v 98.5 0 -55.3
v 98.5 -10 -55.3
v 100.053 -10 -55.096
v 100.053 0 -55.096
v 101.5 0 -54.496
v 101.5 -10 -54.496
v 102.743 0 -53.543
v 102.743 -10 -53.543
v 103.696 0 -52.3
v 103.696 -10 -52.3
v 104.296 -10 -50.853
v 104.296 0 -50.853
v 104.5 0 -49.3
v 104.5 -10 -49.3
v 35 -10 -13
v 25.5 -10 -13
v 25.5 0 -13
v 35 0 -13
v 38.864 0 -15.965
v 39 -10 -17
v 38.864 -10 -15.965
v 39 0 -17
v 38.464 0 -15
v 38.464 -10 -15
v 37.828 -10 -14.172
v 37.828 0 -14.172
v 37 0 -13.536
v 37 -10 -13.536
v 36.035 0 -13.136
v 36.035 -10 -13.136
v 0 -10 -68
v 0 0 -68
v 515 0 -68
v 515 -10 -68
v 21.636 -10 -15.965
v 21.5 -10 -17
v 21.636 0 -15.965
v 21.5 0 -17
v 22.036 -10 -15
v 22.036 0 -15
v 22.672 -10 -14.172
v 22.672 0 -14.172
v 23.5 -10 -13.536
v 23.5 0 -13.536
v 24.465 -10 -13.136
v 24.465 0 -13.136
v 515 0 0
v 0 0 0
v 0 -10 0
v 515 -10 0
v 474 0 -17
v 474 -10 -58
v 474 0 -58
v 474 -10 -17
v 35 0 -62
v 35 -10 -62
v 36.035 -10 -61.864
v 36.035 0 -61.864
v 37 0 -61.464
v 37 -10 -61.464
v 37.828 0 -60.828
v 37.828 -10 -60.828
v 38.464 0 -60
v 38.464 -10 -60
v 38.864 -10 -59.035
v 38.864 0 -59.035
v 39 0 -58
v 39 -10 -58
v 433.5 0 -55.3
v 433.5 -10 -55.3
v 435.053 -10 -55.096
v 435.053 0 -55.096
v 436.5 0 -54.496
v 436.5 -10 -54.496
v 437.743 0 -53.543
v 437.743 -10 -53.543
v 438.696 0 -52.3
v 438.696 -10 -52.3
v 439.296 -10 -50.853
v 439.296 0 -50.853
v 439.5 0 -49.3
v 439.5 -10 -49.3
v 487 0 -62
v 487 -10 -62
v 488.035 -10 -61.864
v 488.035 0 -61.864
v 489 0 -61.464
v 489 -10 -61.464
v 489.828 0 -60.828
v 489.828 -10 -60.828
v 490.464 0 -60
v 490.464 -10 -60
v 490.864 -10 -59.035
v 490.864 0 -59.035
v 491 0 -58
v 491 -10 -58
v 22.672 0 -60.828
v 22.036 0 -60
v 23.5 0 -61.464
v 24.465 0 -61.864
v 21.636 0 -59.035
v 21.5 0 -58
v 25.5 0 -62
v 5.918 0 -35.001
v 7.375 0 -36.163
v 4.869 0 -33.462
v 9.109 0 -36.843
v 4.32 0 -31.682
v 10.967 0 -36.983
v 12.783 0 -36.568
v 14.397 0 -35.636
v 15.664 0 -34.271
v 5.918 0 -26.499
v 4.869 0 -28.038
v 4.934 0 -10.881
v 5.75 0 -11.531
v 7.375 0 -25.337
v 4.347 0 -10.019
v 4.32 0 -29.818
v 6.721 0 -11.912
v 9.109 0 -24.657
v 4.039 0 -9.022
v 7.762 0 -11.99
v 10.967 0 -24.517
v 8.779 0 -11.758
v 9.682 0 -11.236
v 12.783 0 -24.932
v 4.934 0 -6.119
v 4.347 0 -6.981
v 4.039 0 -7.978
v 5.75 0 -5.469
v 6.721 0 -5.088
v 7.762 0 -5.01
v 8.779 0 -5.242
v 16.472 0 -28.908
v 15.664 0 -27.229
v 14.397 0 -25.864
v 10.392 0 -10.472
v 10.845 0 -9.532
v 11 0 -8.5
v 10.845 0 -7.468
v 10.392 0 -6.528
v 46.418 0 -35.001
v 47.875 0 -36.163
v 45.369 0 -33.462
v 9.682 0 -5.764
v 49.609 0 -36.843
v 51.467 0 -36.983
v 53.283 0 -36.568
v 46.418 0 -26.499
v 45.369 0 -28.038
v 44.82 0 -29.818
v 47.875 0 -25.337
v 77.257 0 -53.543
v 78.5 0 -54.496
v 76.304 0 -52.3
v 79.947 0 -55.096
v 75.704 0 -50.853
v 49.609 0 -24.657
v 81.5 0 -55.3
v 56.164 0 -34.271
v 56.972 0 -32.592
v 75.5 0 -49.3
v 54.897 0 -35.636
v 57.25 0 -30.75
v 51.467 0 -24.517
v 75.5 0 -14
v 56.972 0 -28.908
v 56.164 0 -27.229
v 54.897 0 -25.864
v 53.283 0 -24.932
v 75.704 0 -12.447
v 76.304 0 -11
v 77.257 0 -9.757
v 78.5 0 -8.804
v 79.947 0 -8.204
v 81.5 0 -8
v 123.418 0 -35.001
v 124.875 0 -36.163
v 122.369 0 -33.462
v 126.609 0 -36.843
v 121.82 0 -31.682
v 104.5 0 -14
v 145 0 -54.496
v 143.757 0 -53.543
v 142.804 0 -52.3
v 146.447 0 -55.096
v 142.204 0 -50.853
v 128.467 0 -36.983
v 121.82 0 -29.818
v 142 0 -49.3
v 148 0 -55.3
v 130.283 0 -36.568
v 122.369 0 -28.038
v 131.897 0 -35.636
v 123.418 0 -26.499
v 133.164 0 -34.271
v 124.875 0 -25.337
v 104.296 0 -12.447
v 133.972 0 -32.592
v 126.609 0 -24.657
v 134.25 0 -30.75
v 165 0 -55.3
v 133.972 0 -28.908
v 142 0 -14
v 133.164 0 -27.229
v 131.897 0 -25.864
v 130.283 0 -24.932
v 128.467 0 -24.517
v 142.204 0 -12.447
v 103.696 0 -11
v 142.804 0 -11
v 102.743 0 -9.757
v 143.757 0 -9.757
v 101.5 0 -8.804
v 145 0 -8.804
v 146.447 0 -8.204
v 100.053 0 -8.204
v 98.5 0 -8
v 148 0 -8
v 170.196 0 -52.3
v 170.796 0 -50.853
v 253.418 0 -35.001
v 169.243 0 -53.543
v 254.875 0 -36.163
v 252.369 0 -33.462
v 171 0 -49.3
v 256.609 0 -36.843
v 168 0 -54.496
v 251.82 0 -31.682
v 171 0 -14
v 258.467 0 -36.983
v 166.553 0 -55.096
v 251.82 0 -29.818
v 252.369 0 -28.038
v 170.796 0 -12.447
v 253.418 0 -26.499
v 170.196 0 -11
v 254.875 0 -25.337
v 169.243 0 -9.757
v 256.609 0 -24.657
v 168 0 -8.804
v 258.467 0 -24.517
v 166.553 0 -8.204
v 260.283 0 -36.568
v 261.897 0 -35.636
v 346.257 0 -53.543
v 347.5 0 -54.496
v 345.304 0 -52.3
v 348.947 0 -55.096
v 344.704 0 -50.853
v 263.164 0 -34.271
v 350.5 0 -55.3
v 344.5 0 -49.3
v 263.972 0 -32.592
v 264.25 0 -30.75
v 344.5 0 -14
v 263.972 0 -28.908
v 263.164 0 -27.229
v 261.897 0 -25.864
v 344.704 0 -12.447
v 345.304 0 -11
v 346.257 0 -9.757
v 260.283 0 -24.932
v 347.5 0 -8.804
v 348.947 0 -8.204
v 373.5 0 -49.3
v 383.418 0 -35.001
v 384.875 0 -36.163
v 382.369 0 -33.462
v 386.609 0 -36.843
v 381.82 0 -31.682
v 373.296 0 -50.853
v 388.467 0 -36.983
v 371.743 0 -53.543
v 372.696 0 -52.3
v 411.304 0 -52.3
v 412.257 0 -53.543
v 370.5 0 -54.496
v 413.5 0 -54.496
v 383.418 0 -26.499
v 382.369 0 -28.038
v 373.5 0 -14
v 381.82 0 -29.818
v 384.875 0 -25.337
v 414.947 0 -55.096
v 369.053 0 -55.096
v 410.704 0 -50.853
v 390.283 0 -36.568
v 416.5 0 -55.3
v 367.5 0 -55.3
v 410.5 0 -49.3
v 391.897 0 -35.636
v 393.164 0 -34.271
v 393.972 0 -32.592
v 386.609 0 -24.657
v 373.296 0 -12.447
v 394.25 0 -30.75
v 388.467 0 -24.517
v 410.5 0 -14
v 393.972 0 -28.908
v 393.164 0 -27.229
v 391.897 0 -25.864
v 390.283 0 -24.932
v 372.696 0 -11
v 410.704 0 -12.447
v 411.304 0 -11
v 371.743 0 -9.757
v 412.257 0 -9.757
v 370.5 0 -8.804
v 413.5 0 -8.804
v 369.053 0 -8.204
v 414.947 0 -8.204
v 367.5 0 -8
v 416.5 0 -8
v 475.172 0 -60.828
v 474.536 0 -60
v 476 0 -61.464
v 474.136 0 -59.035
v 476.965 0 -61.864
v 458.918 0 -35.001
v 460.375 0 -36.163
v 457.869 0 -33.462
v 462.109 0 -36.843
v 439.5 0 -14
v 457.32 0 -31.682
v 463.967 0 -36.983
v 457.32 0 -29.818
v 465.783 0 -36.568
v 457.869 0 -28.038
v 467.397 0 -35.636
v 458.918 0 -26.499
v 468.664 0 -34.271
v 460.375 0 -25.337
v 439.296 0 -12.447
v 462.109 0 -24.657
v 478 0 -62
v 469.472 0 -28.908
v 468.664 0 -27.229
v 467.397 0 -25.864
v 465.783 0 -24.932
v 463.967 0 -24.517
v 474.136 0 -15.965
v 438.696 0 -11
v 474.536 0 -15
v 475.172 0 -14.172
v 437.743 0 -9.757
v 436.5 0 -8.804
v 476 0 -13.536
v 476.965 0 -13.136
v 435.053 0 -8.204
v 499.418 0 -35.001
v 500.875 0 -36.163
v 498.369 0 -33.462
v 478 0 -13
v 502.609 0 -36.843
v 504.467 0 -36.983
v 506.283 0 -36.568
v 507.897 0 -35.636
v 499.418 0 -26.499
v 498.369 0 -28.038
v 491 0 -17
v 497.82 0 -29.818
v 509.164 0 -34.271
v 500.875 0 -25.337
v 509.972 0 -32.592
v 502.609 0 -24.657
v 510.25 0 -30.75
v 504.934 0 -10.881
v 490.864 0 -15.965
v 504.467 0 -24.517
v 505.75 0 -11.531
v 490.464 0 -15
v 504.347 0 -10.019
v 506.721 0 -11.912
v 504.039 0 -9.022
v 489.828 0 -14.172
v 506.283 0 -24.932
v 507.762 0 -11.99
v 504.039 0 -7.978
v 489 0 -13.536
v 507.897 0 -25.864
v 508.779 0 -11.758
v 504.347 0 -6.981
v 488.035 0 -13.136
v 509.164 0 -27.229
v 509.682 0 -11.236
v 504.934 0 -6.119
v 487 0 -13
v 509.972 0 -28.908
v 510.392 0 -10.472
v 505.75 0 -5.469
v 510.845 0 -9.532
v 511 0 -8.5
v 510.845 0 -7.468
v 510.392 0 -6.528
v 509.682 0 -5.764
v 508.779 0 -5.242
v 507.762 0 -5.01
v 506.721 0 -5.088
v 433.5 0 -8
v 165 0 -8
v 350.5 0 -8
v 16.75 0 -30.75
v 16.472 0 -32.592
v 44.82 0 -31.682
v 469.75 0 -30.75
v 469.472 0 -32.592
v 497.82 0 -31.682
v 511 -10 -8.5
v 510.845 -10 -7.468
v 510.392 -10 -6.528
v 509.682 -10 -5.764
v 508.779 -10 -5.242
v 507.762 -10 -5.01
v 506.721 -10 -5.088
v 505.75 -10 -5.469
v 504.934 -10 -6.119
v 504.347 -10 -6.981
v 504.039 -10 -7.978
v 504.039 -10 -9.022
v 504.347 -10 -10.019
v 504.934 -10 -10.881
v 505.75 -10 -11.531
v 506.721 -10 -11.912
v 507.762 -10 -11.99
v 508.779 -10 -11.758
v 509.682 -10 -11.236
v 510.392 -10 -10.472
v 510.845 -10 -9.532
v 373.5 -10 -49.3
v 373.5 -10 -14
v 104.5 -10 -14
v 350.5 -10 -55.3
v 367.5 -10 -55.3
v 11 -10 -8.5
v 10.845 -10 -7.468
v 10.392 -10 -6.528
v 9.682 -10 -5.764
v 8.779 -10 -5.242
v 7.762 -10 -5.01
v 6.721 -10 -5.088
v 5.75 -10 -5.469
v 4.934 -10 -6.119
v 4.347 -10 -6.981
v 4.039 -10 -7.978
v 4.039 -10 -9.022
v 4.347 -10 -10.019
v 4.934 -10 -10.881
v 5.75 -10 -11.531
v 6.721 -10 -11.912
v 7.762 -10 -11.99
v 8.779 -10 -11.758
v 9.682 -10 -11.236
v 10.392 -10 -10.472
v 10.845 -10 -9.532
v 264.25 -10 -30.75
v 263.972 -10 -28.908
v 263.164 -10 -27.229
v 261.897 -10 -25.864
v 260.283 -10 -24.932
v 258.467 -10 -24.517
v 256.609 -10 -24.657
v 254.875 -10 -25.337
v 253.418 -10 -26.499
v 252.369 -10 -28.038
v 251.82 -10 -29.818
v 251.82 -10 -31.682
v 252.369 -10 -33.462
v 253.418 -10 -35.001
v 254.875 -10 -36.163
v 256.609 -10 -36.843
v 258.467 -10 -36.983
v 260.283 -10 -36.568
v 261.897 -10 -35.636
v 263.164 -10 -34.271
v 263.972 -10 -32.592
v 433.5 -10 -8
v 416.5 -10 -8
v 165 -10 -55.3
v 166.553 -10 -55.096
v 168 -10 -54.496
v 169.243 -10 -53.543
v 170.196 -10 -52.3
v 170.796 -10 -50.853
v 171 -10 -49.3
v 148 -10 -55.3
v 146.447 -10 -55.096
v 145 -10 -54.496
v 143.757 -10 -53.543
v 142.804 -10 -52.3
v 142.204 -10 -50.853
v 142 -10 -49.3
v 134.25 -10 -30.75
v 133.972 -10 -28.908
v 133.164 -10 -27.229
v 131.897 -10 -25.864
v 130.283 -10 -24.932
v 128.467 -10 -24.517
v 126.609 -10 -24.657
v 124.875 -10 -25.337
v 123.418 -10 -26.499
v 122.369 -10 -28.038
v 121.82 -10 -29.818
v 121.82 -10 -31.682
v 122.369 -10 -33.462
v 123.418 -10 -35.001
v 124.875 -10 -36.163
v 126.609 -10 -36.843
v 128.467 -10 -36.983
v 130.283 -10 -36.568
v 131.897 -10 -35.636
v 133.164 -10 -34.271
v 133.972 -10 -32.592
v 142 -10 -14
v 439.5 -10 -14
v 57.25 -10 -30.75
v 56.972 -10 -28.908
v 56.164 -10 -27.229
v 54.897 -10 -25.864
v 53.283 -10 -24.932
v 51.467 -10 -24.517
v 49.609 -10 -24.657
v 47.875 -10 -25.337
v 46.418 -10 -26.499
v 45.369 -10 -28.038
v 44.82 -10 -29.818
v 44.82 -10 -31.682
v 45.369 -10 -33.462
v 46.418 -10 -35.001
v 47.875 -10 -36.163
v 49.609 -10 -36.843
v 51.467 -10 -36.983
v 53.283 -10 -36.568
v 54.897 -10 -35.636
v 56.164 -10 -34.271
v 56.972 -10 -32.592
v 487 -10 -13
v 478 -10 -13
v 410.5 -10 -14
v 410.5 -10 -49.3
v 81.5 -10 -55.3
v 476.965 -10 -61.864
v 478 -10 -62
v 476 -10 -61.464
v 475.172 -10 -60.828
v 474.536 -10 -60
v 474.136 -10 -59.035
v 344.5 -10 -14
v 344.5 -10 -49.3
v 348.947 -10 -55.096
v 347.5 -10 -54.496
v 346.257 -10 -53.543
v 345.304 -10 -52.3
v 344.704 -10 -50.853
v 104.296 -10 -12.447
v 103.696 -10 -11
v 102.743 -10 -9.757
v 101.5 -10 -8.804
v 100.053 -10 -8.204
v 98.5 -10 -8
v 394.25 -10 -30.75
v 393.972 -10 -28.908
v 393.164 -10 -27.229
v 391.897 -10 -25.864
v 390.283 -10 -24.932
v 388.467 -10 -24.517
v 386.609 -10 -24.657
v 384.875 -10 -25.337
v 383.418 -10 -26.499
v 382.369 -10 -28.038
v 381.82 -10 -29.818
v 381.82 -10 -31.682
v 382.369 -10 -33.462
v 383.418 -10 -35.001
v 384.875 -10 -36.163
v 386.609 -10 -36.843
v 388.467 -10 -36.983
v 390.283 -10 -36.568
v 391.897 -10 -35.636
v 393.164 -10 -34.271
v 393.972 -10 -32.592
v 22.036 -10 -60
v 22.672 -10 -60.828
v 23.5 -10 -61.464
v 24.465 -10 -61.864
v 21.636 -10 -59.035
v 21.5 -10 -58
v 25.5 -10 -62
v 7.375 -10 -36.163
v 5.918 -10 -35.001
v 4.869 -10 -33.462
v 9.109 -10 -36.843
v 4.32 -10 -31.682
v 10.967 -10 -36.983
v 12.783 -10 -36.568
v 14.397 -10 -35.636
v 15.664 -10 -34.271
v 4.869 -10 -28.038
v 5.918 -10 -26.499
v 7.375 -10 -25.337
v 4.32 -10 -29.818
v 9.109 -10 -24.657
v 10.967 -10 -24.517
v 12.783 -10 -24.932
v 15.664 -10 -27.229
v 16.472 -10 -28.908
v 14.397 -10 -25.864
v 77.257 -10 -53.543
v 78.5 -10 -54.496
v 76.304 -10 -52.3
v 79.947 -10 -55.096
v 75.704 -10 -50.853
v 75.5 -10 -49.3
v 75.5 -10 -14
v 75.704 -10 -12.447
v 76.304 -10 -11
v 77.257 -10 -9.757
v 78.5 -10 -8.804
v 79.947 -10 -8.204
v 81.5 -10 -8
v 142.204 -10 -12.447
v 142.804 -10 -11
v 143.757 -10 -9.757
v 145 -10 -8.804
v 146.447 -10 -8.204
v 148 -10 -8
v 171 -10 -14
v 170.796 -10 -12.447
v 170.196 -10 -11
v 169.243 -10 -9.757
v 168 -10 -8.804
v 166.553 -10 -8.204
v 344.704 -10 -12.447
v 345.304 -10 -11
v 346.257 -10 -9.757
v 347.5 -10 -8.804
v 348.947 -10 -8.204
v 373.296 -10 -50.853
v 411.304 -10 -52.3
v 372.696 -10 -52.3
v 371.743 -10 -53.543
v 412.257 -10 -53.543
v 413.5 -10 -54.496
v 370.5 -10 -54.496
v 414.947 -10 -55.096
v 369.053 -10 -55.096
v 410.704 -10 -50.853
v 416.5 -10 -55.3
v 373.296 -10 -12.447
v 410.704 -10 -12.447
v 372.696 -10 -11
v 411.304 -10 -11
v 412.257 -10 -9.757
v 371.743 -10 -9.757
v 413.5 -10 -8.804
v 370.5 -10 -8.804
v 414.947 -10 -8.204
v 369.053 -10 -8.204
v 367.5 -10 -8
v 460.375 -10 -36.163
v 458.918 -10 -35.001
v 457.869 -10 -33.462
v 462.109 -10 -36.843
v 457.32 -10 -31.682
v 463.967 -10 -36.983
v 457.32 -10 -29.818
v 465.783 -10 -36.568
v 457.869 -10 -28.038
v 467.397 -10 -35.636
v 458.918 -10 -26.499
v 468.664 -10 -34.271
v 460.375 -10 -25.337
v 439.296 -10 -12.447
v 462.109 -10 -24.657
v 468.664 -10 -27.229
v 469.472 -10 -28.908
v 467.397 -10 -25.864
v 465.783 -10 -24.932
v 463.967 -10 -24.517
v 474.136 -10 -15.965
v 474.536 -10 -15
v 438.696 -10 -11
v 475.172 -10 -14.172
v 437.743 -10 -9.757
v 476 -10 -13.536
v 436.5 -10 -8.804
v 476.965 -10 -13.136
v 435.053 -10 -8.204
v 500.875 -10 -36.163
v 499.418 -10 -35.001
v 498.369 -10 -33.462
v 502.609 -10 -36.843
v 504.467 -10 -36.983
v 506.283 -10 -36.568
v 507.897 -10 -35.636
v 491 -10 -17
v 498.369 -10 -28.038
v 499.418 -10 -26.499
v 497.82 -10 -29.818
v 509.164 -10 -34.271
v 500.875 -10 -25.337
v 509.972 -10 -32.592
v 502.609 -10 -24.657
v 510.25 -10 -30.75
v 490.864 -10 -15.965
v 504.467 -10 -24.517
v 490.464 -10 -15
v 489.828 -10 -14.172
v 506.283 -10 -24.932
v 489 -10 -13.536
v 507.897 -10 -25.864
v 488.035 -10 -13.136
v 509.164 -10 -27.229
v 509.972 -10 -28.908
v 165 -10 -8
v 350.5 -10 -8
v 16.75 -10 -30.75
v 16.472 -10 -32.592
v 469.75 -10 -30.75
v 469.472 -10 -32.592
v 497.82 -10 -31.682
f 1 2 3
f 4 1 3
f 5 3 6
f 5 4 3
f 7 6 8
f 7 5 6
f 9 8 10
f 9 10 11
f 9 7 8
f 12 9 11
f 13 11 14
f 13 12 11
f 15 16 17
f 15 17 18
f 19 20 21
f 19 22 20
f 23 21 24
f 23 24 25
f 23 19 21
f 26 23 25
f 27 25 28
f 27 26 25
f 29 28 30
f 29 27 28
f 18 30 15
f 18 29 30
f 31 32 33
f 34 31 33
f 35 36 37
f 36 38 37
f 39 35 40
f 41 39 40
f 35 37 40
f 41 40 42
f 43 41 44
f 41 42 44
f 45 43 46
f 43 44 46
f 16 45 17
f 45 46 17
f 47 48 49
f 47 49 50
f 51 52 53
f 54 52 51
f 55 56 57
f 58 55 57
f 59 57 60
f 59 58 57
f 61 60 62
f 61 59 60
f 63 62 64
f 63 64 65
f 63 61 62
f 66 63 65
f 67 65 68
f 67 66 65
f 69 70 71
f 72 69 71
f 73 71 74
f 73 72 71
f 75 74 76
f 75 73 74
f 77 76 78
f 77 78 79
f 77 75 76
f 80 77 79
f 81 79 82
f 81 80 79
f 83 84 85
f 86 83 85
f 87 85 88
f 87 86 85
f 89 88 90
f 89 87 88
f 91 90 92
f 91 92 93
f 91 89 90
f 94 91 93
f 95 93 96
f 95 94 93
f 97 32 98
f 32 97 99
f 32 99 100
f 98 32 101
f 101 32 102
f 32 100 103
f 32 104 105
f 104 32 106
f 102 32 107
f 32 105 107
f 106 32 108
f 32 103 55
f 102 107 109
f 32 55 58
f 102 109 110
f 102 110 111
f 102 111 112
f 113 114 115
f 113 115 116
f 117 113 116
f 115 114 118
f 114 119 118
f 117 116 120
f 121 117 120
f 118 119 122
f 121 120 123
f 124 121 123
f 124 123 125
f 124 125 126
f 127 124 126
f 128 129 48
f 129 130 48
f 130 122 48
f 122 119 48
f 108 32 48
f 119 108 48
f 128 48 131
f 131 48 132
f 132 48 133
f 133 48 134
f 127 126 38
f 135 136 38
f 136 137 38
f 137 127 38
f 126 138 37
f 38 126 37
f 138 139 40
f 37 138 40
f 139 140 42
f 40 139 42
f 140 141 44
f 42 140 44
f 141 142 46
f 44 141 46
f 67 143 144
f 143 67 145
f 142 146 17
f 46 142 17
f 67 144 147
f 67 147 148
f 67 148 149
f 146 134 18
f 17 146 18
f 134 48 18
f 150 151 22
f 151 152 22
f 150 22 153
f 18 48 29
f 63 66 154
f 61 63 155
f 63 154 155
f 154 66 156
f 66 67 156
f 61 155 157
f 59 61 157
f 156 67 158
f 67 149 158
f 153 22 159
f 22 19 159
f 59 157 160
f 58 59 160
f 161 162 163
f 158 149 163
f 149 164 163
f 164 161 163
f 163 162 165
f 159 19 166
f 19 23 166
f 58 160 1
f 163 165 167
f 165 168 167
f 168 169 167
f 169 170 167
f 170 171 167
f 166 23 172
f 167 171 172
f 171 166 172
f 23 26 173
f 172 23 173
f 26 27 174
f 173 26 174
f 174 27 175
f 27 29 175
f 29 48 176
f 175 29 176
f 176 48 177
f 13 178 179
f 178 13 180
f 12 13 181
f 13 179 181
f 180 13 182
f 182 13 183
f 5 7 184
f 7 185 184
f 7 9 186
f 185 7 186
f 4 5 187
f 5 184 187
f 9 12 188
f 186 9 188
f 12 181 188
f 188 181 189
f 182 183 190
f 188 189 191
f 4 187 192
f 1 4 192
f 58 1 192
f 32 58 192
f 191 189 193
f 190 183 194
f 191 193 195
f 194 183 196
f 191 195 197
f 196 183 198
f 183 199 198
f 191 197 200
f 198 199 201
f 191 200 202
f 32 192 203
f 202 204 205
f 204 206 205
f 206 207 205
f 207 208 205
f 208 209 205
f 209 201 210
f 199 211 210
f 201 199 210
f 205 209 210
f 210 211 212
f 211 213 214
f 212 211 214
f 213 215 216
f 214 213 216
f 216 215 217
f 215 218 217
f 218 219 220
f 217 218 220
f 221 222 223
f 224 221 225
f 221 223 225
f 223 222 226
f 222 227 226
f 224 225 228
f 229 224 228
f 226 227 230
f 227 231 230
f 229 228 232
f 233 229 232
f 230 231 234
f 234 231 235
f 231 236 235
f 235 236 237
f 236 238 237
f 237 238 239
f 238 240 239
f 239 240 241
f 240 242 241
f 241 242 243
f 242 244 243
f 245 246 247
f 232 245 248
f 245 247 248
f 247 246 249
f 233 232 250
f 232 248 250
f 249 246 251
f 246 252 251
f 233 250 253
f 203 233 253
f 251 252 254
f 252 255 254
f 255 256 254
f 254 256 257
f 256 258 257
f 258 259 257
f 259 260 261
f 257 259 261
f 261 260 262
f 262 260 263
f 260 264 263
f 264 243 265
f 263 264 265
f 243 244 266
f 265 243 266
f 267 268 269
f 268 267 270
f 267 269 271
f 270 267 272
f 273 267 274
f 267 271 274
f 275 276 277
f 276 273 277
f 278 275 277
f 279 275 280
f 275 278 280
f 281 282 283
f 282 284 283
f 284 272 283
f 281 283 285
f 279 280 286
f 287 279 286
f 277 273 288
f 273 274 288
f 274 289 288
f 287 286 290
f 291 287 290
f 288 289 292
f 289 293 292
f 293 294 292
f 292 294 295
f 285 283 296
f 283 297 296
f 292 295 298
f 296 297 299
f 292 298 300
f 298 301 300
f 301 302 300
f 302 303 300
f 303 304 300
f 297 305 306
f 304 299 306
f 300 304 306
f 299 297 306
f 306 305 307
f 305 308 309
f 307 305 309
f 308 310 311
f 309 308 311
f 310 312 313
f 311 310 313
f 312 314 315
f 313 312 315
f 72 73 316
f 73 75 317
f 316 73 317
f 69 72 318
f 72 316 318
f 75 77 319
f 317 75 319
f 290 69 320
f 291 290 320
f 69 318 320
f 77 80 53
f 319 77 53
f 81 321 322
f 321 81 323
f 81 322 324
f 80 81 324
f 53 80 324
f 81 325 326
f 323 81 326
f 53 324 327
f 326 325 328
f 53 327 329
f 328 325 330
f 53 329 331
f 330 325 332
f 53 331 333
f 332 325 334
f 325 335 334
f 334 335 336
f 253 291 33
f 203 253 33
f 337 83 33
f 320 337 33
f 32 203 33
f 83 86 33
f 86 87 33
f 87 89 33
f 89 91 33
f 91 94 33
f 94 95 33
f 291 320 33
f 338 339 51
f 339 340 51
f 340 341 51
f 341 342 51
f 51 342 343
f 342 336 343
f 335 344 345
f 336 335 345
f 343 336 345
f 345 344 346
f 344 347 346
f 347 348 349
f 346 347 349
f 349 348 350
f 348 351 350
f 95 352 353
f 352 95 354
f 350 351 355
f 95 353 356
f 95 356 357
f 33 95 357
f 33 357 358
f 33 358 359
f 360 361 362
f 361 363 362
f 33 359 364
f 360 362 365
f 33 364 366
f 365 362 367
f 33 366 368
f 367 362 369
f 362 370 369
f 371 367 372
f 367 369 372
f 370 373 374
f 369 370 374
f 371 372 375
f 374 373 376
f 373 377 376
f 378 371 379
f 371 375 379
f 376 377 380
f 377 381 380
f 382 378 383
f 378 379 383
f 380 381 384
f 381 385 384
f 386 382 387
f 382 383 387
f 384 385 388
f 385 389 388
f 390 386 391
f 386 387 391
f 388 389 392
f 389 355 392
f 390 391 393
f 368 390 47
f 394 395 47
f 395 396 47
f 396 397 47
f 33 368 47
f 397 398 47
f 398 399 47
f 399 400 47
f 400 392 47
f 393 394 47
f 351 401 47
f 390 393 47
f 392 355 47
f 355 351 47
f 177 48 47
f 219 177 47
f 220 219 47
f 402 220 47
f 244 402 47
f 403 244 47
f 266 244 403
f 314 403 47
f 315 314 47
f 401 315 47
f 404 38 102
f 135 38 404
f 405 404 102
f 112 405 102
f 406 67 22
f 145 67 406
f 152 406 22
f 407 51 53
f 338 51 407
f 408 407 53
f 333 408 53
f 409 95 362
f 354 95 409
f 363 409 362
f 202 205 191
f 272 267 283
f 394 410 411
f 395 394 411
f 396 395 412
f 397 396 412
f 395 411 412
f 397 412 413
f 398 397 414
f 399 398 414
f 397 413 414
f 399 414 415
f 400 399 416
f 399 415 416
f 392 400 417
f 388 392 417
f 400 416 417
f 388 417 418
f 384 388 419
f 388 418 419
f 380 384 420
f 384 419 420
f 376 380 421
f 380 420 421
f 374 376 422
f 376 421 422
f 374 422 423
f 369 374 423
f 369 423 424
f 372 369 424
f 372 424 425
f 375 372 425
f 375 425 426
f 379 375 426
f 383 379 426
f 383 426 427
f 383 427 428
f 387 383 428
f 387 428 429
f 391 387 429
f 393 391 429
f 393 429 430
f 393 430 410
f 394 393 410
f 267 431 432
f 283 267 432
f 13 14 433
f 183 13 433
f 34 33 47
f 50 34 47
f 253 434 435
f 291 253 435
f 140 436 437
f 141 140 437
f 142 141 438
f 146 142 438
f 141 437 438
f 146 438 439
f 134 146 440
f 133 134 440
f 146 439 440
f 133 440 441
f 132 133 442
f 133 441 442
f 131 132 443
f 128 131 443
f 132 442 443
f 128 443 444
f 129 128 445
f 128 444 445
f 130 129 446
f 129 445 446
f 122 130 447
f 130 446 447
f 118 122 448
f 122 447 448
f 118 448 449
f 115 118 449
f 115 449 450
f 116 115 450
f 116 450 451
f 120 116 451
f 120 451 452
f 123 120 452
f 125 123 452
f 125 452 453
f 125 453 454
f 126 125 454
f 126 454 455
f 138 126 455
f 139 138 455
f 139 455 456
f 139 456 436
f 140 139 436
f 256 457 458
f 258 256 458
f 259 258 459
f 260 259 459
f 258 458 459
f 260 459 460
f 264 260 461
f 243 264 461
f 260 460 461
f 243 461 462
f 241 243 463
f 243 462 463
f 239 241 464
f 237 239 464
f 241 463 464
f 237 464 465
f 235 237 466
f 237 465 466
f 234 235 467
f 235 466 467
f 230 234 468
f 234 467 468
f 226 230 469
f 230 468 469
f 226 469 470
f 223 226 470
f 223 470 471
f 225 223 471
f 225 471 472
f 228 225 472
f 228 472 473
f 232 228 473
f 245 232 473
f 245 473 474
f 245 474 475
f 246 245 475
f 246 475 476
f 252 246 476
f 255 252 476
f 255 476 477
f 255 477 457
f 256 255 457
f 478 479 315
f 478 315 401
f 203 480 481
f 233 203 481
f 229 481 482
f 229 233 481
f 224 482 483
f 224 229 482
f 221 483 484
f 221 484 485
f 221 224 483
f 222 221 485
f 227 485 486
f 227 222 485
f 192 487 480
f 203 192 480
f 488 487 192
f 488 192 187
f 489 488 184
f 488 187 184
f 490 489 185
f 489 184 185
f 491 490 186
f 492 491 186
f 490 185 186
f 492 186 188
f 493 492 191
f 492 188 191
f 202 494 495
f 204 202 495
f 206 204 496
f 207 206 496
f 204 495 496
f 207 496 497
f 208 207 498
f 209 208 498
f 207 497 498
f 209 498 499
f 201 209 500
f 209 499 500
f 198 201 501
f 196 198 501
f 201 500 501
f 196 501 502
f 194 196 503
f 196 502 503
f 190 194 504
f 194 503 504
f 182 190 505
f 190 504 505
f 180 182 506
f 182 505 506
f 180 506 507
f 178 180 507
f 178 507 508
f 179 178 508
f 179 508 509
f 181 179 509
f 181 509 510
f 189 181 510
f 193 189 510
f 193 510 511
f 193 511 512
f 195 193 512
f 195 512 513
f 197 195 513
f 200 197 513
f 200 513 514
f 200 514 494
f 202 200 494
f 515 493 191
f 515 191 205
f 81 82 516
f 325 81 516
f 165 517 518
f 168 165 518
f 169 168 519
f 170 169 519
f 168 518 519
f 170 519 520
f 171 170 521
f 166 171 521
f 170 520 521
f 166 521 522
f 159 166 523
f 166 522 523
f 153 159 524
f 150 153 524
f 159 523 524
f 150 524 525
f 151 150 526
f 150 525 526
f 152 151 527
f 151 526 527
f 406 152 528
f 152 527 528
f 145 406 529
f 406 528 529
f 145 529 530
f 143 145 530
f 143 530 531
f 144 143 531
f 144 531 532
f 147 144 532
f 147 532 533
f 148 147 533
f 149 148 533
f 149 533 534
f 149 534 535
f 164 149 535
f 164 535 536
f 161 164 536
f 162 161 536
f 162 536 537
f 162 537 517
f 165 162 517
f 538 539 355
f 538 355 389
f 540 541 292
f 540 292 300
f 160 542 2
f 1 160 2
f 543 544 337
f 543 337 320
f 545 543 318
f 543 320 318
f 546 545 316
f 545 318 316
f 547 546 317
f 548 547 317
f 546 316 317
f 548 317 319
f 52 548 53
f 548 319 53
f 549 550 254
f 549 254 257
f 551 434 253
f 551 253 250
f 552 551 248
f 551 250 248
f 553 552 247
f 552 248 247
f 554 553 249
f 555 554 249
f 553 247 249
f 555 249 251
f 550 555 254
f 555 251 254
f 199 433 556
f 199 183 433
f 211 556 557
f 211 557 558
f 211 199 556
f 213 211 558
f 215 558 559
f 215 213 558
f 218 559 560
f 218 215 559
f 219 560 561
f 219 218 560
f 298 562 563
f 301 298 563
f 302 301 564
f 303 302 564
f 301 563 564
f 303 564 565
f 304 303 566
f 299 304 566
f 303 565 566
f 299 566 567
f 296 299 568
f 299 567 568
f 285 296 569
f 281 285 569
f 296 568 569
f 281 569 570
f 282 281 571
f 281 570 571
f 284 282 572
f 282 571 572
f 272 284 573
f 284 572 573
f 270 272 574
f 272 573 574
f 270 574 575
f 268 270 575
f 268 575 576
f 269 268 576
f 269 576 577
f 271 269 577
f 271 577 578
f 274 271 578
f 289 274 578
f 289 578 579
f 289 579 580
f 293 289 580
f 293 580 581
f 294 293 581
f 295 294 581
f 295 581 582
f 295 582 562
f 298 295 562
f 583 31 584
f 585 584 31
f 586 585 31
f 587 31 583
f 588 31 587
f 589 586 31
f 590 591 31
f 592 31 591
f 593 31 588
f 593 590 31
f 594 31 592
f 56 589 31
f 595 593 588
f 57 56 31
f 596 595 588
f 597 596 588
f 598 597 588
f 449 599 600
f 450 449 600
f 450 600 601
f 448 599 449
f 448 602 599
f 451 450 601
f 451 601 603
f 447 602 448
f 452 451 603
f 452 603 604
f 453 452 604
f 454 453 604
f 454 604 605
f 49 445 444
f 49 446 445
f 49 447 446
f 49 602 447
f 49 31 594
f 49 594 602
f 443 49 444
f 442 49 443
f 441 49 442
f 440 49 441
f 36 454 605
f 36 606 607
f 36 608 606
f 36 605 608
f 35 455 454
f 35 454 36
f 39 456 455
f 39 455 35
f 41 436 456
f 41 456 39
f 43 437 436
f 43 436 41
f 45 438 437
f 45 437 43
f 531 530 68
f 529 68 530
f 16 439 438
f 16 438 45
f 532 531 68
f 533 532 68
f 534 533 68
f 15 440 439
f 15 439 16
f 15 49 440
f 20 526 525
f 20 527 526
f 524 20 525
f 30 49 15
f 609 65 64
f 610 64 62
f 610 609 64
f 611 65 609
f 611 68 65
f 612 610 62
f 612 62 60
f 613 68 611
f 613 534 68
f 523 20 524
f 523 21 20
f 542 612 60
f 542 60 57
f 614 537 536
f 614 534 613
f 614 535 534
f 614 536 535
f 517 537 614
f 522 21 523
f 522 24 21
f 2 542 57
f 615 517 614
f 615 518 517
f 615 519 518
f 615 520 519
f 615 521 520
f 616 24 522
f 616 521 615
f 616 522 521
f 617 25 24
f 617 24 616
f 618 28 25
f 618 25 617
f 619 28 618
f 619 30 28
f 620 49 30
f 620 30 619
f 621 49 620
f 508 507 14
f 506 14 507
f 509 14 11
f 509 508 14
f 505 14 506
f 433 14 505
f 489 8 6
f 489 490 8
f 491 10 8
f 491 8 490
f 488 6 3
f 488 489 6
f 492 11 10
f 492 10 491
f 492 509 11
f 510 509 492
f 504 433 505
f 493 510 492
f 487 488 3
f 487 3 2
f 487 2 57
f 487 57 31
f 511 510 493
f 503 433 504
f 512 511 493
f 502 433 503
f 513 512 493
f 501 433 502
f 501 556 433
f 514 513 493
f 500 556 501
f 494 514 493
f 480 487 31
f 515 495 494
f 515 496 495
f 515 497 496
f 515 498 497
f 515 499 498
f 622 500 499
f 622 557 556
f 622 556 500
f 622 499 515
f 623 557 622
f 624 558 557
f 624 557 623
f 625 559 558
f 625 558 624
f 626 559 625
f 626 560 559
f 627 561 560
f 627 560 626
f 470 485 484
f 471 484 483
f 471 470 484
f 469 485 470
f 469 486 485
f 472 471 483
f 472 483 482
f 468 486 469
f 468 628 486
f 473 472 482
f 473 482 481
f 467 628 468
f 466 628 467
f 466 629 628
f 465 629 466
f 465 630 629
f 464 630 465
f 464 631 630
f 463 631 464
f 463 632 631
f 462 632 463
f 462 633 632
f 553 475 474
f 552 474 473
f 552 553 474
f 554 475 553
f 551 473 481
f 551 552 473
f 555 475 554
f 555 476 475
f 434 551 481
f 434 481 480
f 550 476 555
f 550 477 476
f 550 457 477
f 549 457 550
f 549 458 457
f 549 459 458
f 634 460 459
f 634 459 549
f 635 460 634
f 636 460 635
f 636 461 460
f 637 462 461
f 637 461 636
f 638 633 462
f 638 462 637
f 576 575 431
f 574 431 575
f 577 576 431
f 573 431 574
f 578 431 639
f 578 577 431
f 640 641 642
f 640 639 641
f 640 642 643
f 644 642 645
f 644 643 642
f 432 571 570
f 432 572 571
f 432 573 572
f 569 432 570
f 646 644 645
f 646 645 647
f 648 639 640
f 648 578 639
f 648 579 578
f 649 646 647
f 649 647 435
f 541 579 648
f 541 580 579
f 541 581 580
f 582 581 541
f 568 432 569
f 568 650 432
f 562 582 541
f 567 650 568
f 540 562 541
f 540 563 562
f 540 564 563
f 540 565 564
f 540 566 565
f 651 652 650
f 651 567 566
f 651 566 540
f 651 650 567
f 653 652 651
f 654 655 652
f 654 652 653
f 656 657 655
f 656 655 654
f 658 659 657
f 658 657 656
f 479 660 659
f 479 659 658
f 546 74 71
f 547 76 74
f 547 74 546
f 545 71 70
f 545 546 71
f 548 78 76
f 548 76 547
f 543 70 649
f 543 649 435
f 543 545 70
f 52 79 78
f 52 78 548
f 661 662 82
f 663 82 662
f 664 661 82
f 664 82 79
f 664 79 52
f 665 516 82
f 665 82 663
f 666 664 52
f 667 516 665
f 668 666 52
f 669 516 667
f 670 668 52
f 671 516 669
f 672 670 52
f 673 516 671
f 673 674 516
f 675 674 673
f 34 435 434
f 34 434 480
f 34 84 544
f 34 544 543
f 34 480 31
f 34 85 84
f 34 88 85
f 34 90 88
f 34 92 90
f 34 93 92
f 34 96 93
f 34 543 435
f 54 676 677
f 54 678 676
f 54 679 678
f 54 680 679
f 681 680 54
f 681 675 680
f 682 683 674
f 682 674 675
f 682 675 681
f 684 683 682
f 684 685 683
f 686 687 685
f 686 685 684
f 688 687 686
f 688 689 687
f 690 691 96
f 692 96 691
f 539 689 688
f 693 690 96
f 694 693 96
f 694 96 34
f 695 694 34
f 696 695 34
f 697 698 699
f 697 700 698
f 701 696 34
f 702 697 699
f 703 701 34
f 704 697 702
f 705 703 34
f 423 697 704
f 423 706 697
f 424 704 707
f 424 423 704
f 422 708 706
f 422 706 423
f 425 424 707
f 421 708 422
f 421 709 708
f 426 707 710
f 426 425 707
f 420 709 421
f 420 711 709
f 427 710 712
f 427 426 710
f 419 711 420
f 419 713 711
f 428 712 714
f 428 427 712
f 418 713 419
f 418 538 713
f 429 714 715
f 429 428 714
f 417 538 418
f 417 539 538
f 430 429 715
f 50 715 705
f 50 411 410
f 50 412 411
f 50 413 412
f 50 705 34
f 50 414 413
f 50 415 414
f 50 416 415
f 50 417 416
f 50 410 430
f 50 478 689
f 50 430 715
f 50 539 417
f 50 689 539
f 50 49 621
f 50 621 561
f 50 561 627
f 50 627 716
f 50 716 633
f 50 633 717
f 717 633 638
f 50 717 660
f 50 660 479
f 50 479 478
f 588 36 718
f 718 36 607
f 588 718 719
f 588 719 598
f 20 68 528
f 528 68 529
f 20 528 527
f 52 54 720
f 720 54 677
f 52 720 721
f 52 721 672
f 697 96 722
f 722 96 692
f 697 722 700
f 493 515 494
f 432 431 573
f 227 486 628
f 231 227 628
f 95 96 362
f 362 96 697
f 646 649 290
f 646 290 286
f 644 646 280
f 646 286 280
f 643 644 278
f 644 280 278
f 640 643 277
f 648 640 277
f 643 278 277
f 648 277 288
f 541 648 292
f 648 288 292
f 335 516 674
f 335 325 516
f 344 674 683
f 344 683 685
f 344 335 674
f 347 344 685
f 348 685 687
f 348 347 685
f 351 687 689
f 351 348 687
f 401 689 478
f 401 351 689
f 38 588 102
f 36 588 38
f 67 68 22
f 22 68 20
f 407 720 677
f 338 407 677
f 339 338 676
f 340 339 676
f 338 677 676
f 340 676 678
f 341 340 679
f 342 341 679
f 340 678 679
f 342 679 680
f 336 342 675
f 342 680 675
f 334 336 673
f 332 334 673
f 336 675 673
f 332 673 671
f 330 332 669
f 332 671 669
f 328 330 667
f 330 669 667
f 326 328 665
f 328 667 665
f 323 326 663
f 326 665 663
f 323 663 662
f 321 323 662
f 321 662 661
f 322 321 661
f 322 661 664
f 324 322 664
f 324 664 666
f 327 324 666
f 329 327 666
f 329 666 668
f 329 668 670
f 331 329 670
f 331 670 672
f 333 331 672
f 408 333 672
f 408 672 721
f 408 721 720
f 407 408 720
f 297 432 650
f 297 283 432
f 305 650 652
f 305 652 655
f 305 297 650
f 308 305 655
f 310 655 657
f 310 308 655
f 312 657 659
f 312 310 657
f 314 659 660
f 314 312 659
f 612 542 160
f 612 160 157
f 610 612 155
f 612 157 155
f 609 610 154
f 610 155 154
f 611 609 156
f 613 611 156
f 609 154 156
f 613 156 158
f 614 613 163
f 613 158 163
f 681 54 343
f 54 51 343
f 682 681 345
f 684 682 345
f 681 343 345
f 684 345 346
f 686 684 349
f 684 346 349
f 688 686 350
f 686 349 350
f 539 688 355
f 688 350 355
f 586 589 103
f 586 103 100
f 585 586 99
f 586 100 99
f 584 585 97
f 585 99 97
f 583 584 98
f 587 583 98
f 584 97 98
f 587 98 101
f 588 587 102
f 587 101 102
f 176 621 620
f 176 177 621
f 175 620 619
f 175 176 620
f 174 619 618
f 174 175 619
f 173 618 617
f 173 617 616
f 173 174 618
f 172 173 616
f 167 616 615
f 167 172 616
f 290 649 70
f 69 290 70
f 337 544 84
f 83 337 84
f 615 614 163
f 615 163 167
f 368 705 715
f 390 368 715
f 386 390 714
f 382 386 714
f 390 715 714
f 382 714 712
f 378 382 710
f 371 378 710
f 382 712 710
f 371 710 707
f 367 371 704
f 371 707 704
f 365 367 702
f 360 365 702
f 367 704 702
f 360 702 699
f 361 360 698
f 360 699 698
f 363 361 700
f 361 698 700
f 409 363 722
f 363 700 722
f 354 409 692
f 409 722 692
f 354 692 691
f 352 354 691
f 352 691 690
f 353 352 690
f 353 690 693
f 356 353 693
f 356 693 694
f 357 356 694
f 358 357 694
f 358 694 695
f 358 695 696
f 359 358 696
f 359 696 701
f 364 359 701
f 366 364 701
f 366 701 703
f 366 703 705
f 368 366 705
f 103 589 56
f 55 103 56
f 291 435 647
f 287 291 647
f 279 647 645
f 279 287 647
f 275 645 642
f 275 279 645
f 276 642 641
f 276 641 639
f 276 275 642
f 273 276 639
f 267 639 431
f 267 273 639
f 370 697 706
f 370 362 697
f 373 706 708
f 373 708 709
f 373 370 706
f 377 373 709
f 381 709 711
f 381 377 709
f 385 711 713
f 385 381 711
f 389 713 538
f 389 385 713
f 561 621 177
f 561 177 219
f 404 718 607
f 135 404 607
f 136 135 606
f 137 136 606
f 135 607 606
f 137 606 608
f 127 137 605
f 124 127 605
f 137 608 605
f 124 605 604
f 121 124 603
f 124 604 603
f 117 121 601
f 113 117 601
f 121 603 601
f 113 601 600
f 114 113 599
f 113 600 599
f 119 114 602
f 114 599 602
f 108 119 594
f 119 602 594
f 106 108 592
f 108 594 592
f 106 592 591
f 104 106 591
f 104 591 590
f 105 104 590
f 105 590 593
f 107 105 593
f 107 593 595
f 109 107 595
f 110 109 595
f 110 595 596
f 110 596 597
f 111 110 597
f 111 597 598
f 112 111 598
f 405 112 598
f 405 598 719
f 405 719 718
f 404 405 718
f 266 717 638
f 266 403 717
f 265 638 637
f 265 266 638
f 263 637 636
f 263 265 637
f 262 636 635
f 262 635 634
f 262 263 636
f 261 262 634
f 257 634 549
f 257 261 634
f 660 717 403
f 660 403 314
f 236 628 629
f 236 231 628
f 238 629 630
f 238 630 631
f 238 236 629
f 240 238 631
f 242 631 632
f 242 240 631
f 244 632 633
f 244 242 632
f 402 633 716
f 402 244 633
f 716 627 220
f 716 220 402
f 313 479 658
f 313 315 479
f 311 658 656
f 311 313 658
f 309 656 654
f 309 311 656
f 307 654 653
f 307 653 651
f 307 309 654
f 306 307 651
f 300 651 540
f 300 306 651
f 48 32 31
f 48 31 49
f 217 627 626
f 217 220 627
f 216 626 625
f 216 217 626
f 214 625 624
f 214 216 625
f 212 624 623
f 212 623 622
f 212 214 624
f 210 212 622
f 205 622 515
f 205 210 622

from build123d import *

# Parameters (mm, degrees)
F0_W     = 515
F0_H     = 68
F1_DEPTH = 10
F2_R     = 3.5
F2_R_2   = 6.25
F3_DEPTH = 10.001
F4_W     = 17.5
F4_H     = 49
F4_W_2   = 17
F5_DEPTH = 10.001
F4_W_3   = 29
F4_H_2   = 47.3
F6_DEPTH = 10.001
F7_R     = 4
F8_R     = 6


with BuildPart() as f1:
    # F0 (on Front) → F1 (new body)
    with BuildSketch(Plane.XZ):
        with Locations((257.5, -34)):
            Rectangle(F0_W, F0_H)
    extrude(amount=F1_DEPTH)

    # F2 (on face) → F3 (cut, through all)
    with BuildSketch(Plane.XZ.offset(10)):
        with Locations((7.5, -8.5)):
            Circle(F2_R)
        with Locations((507.5, -8.5)):
            Circle(F2_R)
        with Locations((10.5, -30.75)):
            Circle(F2_R_2)
        with Locations((51, -30.75)):
            Circle(F2_R_2)
        with Locations((128, -30.75)):
            Circle(F2_R_2)
        with Locations((258, -30.75)):
            Circle(F2_R_2)
        with Locations((388, -30.75)):
            Circle(F2_R_2)
        with Locations((463.5, -30.75)):
            Circle(F2_R_2)
        with Locations((504, -30.75)):
            Circle(F2_R_2)
    extrude(amount=-F3_DEPTH, mode=Mode.SUBTRACT)

    # F4 (on face) → F5 (cut, through all)
    with BuildSketch(Plane.XZ.offset(10)):
        with Locations((30.25, -37.5)):
            Rectangle(F4_W, F4_H)
        with Locations((482.5, -37.5)):
            Rectangle(F4_W_2, F4_H)
    extrude(amount=-F5_DEPTH, mode=Mode.SUBTRACT)

    # F4 (on face) → F6 (cut, through all)
    with BuildSketch(Plane.XZ.offset(10)):
        with Locations((90, -31.65)):
            Rectangle(F4_W_3, F4_H_2)
        with Locations((156.5, -31.65)):
            Rectangle(F4_W_3, F4_H_2)
        with Locations((359, -31.65)):
            Rectangle(F4_W_3, F4_H_2)
        with Locations((425, -31.65)):
            Rectangle(F4_W_3, F4_H_2)
    extrude(amount=-F6_DEPTH, mode=Mode.SUBTRACT)

    # F7
    f7_edges = [f1.edges().sort_by_distance(p)[0] for p in [
        (21.5, -5, -13),
        (21.5, -5, -62),
        (39, -5, -62),
        (39, -5, -13),
        (491, -5, -13),
        (474, -5, -13),
        (474, -5, -62),
        (491, -5, -62),
    ]]
    fillet(f7_edges, radius=F7_R)

    # F8
    f8_edges = [f1.edges().sort_by_distance(p)[0] for p in [
        (410.5, -5, -8),
        (439.5, -5, -8),
        (75.5, -5, -8),
        (104.5, -5, -8),
        (171, -5, -8),
        (75.5, -5, -55.3),
        (142, -5, -55.3),
        (142, -5, -8),
        (171, -5, -55.3),
        (104.5, -5, -55.3),
        (439.5, -5, -55.3),
        (373.5, -5, -55.3),
        (410.5, -5, -55.3),
        (344.5, -5, -55.3),
        (373.5, -5, -8),
        (344.5, -5, -8),
    ]]
    fillet(f8_edges, radius=F8_R)


solid = f1.part
